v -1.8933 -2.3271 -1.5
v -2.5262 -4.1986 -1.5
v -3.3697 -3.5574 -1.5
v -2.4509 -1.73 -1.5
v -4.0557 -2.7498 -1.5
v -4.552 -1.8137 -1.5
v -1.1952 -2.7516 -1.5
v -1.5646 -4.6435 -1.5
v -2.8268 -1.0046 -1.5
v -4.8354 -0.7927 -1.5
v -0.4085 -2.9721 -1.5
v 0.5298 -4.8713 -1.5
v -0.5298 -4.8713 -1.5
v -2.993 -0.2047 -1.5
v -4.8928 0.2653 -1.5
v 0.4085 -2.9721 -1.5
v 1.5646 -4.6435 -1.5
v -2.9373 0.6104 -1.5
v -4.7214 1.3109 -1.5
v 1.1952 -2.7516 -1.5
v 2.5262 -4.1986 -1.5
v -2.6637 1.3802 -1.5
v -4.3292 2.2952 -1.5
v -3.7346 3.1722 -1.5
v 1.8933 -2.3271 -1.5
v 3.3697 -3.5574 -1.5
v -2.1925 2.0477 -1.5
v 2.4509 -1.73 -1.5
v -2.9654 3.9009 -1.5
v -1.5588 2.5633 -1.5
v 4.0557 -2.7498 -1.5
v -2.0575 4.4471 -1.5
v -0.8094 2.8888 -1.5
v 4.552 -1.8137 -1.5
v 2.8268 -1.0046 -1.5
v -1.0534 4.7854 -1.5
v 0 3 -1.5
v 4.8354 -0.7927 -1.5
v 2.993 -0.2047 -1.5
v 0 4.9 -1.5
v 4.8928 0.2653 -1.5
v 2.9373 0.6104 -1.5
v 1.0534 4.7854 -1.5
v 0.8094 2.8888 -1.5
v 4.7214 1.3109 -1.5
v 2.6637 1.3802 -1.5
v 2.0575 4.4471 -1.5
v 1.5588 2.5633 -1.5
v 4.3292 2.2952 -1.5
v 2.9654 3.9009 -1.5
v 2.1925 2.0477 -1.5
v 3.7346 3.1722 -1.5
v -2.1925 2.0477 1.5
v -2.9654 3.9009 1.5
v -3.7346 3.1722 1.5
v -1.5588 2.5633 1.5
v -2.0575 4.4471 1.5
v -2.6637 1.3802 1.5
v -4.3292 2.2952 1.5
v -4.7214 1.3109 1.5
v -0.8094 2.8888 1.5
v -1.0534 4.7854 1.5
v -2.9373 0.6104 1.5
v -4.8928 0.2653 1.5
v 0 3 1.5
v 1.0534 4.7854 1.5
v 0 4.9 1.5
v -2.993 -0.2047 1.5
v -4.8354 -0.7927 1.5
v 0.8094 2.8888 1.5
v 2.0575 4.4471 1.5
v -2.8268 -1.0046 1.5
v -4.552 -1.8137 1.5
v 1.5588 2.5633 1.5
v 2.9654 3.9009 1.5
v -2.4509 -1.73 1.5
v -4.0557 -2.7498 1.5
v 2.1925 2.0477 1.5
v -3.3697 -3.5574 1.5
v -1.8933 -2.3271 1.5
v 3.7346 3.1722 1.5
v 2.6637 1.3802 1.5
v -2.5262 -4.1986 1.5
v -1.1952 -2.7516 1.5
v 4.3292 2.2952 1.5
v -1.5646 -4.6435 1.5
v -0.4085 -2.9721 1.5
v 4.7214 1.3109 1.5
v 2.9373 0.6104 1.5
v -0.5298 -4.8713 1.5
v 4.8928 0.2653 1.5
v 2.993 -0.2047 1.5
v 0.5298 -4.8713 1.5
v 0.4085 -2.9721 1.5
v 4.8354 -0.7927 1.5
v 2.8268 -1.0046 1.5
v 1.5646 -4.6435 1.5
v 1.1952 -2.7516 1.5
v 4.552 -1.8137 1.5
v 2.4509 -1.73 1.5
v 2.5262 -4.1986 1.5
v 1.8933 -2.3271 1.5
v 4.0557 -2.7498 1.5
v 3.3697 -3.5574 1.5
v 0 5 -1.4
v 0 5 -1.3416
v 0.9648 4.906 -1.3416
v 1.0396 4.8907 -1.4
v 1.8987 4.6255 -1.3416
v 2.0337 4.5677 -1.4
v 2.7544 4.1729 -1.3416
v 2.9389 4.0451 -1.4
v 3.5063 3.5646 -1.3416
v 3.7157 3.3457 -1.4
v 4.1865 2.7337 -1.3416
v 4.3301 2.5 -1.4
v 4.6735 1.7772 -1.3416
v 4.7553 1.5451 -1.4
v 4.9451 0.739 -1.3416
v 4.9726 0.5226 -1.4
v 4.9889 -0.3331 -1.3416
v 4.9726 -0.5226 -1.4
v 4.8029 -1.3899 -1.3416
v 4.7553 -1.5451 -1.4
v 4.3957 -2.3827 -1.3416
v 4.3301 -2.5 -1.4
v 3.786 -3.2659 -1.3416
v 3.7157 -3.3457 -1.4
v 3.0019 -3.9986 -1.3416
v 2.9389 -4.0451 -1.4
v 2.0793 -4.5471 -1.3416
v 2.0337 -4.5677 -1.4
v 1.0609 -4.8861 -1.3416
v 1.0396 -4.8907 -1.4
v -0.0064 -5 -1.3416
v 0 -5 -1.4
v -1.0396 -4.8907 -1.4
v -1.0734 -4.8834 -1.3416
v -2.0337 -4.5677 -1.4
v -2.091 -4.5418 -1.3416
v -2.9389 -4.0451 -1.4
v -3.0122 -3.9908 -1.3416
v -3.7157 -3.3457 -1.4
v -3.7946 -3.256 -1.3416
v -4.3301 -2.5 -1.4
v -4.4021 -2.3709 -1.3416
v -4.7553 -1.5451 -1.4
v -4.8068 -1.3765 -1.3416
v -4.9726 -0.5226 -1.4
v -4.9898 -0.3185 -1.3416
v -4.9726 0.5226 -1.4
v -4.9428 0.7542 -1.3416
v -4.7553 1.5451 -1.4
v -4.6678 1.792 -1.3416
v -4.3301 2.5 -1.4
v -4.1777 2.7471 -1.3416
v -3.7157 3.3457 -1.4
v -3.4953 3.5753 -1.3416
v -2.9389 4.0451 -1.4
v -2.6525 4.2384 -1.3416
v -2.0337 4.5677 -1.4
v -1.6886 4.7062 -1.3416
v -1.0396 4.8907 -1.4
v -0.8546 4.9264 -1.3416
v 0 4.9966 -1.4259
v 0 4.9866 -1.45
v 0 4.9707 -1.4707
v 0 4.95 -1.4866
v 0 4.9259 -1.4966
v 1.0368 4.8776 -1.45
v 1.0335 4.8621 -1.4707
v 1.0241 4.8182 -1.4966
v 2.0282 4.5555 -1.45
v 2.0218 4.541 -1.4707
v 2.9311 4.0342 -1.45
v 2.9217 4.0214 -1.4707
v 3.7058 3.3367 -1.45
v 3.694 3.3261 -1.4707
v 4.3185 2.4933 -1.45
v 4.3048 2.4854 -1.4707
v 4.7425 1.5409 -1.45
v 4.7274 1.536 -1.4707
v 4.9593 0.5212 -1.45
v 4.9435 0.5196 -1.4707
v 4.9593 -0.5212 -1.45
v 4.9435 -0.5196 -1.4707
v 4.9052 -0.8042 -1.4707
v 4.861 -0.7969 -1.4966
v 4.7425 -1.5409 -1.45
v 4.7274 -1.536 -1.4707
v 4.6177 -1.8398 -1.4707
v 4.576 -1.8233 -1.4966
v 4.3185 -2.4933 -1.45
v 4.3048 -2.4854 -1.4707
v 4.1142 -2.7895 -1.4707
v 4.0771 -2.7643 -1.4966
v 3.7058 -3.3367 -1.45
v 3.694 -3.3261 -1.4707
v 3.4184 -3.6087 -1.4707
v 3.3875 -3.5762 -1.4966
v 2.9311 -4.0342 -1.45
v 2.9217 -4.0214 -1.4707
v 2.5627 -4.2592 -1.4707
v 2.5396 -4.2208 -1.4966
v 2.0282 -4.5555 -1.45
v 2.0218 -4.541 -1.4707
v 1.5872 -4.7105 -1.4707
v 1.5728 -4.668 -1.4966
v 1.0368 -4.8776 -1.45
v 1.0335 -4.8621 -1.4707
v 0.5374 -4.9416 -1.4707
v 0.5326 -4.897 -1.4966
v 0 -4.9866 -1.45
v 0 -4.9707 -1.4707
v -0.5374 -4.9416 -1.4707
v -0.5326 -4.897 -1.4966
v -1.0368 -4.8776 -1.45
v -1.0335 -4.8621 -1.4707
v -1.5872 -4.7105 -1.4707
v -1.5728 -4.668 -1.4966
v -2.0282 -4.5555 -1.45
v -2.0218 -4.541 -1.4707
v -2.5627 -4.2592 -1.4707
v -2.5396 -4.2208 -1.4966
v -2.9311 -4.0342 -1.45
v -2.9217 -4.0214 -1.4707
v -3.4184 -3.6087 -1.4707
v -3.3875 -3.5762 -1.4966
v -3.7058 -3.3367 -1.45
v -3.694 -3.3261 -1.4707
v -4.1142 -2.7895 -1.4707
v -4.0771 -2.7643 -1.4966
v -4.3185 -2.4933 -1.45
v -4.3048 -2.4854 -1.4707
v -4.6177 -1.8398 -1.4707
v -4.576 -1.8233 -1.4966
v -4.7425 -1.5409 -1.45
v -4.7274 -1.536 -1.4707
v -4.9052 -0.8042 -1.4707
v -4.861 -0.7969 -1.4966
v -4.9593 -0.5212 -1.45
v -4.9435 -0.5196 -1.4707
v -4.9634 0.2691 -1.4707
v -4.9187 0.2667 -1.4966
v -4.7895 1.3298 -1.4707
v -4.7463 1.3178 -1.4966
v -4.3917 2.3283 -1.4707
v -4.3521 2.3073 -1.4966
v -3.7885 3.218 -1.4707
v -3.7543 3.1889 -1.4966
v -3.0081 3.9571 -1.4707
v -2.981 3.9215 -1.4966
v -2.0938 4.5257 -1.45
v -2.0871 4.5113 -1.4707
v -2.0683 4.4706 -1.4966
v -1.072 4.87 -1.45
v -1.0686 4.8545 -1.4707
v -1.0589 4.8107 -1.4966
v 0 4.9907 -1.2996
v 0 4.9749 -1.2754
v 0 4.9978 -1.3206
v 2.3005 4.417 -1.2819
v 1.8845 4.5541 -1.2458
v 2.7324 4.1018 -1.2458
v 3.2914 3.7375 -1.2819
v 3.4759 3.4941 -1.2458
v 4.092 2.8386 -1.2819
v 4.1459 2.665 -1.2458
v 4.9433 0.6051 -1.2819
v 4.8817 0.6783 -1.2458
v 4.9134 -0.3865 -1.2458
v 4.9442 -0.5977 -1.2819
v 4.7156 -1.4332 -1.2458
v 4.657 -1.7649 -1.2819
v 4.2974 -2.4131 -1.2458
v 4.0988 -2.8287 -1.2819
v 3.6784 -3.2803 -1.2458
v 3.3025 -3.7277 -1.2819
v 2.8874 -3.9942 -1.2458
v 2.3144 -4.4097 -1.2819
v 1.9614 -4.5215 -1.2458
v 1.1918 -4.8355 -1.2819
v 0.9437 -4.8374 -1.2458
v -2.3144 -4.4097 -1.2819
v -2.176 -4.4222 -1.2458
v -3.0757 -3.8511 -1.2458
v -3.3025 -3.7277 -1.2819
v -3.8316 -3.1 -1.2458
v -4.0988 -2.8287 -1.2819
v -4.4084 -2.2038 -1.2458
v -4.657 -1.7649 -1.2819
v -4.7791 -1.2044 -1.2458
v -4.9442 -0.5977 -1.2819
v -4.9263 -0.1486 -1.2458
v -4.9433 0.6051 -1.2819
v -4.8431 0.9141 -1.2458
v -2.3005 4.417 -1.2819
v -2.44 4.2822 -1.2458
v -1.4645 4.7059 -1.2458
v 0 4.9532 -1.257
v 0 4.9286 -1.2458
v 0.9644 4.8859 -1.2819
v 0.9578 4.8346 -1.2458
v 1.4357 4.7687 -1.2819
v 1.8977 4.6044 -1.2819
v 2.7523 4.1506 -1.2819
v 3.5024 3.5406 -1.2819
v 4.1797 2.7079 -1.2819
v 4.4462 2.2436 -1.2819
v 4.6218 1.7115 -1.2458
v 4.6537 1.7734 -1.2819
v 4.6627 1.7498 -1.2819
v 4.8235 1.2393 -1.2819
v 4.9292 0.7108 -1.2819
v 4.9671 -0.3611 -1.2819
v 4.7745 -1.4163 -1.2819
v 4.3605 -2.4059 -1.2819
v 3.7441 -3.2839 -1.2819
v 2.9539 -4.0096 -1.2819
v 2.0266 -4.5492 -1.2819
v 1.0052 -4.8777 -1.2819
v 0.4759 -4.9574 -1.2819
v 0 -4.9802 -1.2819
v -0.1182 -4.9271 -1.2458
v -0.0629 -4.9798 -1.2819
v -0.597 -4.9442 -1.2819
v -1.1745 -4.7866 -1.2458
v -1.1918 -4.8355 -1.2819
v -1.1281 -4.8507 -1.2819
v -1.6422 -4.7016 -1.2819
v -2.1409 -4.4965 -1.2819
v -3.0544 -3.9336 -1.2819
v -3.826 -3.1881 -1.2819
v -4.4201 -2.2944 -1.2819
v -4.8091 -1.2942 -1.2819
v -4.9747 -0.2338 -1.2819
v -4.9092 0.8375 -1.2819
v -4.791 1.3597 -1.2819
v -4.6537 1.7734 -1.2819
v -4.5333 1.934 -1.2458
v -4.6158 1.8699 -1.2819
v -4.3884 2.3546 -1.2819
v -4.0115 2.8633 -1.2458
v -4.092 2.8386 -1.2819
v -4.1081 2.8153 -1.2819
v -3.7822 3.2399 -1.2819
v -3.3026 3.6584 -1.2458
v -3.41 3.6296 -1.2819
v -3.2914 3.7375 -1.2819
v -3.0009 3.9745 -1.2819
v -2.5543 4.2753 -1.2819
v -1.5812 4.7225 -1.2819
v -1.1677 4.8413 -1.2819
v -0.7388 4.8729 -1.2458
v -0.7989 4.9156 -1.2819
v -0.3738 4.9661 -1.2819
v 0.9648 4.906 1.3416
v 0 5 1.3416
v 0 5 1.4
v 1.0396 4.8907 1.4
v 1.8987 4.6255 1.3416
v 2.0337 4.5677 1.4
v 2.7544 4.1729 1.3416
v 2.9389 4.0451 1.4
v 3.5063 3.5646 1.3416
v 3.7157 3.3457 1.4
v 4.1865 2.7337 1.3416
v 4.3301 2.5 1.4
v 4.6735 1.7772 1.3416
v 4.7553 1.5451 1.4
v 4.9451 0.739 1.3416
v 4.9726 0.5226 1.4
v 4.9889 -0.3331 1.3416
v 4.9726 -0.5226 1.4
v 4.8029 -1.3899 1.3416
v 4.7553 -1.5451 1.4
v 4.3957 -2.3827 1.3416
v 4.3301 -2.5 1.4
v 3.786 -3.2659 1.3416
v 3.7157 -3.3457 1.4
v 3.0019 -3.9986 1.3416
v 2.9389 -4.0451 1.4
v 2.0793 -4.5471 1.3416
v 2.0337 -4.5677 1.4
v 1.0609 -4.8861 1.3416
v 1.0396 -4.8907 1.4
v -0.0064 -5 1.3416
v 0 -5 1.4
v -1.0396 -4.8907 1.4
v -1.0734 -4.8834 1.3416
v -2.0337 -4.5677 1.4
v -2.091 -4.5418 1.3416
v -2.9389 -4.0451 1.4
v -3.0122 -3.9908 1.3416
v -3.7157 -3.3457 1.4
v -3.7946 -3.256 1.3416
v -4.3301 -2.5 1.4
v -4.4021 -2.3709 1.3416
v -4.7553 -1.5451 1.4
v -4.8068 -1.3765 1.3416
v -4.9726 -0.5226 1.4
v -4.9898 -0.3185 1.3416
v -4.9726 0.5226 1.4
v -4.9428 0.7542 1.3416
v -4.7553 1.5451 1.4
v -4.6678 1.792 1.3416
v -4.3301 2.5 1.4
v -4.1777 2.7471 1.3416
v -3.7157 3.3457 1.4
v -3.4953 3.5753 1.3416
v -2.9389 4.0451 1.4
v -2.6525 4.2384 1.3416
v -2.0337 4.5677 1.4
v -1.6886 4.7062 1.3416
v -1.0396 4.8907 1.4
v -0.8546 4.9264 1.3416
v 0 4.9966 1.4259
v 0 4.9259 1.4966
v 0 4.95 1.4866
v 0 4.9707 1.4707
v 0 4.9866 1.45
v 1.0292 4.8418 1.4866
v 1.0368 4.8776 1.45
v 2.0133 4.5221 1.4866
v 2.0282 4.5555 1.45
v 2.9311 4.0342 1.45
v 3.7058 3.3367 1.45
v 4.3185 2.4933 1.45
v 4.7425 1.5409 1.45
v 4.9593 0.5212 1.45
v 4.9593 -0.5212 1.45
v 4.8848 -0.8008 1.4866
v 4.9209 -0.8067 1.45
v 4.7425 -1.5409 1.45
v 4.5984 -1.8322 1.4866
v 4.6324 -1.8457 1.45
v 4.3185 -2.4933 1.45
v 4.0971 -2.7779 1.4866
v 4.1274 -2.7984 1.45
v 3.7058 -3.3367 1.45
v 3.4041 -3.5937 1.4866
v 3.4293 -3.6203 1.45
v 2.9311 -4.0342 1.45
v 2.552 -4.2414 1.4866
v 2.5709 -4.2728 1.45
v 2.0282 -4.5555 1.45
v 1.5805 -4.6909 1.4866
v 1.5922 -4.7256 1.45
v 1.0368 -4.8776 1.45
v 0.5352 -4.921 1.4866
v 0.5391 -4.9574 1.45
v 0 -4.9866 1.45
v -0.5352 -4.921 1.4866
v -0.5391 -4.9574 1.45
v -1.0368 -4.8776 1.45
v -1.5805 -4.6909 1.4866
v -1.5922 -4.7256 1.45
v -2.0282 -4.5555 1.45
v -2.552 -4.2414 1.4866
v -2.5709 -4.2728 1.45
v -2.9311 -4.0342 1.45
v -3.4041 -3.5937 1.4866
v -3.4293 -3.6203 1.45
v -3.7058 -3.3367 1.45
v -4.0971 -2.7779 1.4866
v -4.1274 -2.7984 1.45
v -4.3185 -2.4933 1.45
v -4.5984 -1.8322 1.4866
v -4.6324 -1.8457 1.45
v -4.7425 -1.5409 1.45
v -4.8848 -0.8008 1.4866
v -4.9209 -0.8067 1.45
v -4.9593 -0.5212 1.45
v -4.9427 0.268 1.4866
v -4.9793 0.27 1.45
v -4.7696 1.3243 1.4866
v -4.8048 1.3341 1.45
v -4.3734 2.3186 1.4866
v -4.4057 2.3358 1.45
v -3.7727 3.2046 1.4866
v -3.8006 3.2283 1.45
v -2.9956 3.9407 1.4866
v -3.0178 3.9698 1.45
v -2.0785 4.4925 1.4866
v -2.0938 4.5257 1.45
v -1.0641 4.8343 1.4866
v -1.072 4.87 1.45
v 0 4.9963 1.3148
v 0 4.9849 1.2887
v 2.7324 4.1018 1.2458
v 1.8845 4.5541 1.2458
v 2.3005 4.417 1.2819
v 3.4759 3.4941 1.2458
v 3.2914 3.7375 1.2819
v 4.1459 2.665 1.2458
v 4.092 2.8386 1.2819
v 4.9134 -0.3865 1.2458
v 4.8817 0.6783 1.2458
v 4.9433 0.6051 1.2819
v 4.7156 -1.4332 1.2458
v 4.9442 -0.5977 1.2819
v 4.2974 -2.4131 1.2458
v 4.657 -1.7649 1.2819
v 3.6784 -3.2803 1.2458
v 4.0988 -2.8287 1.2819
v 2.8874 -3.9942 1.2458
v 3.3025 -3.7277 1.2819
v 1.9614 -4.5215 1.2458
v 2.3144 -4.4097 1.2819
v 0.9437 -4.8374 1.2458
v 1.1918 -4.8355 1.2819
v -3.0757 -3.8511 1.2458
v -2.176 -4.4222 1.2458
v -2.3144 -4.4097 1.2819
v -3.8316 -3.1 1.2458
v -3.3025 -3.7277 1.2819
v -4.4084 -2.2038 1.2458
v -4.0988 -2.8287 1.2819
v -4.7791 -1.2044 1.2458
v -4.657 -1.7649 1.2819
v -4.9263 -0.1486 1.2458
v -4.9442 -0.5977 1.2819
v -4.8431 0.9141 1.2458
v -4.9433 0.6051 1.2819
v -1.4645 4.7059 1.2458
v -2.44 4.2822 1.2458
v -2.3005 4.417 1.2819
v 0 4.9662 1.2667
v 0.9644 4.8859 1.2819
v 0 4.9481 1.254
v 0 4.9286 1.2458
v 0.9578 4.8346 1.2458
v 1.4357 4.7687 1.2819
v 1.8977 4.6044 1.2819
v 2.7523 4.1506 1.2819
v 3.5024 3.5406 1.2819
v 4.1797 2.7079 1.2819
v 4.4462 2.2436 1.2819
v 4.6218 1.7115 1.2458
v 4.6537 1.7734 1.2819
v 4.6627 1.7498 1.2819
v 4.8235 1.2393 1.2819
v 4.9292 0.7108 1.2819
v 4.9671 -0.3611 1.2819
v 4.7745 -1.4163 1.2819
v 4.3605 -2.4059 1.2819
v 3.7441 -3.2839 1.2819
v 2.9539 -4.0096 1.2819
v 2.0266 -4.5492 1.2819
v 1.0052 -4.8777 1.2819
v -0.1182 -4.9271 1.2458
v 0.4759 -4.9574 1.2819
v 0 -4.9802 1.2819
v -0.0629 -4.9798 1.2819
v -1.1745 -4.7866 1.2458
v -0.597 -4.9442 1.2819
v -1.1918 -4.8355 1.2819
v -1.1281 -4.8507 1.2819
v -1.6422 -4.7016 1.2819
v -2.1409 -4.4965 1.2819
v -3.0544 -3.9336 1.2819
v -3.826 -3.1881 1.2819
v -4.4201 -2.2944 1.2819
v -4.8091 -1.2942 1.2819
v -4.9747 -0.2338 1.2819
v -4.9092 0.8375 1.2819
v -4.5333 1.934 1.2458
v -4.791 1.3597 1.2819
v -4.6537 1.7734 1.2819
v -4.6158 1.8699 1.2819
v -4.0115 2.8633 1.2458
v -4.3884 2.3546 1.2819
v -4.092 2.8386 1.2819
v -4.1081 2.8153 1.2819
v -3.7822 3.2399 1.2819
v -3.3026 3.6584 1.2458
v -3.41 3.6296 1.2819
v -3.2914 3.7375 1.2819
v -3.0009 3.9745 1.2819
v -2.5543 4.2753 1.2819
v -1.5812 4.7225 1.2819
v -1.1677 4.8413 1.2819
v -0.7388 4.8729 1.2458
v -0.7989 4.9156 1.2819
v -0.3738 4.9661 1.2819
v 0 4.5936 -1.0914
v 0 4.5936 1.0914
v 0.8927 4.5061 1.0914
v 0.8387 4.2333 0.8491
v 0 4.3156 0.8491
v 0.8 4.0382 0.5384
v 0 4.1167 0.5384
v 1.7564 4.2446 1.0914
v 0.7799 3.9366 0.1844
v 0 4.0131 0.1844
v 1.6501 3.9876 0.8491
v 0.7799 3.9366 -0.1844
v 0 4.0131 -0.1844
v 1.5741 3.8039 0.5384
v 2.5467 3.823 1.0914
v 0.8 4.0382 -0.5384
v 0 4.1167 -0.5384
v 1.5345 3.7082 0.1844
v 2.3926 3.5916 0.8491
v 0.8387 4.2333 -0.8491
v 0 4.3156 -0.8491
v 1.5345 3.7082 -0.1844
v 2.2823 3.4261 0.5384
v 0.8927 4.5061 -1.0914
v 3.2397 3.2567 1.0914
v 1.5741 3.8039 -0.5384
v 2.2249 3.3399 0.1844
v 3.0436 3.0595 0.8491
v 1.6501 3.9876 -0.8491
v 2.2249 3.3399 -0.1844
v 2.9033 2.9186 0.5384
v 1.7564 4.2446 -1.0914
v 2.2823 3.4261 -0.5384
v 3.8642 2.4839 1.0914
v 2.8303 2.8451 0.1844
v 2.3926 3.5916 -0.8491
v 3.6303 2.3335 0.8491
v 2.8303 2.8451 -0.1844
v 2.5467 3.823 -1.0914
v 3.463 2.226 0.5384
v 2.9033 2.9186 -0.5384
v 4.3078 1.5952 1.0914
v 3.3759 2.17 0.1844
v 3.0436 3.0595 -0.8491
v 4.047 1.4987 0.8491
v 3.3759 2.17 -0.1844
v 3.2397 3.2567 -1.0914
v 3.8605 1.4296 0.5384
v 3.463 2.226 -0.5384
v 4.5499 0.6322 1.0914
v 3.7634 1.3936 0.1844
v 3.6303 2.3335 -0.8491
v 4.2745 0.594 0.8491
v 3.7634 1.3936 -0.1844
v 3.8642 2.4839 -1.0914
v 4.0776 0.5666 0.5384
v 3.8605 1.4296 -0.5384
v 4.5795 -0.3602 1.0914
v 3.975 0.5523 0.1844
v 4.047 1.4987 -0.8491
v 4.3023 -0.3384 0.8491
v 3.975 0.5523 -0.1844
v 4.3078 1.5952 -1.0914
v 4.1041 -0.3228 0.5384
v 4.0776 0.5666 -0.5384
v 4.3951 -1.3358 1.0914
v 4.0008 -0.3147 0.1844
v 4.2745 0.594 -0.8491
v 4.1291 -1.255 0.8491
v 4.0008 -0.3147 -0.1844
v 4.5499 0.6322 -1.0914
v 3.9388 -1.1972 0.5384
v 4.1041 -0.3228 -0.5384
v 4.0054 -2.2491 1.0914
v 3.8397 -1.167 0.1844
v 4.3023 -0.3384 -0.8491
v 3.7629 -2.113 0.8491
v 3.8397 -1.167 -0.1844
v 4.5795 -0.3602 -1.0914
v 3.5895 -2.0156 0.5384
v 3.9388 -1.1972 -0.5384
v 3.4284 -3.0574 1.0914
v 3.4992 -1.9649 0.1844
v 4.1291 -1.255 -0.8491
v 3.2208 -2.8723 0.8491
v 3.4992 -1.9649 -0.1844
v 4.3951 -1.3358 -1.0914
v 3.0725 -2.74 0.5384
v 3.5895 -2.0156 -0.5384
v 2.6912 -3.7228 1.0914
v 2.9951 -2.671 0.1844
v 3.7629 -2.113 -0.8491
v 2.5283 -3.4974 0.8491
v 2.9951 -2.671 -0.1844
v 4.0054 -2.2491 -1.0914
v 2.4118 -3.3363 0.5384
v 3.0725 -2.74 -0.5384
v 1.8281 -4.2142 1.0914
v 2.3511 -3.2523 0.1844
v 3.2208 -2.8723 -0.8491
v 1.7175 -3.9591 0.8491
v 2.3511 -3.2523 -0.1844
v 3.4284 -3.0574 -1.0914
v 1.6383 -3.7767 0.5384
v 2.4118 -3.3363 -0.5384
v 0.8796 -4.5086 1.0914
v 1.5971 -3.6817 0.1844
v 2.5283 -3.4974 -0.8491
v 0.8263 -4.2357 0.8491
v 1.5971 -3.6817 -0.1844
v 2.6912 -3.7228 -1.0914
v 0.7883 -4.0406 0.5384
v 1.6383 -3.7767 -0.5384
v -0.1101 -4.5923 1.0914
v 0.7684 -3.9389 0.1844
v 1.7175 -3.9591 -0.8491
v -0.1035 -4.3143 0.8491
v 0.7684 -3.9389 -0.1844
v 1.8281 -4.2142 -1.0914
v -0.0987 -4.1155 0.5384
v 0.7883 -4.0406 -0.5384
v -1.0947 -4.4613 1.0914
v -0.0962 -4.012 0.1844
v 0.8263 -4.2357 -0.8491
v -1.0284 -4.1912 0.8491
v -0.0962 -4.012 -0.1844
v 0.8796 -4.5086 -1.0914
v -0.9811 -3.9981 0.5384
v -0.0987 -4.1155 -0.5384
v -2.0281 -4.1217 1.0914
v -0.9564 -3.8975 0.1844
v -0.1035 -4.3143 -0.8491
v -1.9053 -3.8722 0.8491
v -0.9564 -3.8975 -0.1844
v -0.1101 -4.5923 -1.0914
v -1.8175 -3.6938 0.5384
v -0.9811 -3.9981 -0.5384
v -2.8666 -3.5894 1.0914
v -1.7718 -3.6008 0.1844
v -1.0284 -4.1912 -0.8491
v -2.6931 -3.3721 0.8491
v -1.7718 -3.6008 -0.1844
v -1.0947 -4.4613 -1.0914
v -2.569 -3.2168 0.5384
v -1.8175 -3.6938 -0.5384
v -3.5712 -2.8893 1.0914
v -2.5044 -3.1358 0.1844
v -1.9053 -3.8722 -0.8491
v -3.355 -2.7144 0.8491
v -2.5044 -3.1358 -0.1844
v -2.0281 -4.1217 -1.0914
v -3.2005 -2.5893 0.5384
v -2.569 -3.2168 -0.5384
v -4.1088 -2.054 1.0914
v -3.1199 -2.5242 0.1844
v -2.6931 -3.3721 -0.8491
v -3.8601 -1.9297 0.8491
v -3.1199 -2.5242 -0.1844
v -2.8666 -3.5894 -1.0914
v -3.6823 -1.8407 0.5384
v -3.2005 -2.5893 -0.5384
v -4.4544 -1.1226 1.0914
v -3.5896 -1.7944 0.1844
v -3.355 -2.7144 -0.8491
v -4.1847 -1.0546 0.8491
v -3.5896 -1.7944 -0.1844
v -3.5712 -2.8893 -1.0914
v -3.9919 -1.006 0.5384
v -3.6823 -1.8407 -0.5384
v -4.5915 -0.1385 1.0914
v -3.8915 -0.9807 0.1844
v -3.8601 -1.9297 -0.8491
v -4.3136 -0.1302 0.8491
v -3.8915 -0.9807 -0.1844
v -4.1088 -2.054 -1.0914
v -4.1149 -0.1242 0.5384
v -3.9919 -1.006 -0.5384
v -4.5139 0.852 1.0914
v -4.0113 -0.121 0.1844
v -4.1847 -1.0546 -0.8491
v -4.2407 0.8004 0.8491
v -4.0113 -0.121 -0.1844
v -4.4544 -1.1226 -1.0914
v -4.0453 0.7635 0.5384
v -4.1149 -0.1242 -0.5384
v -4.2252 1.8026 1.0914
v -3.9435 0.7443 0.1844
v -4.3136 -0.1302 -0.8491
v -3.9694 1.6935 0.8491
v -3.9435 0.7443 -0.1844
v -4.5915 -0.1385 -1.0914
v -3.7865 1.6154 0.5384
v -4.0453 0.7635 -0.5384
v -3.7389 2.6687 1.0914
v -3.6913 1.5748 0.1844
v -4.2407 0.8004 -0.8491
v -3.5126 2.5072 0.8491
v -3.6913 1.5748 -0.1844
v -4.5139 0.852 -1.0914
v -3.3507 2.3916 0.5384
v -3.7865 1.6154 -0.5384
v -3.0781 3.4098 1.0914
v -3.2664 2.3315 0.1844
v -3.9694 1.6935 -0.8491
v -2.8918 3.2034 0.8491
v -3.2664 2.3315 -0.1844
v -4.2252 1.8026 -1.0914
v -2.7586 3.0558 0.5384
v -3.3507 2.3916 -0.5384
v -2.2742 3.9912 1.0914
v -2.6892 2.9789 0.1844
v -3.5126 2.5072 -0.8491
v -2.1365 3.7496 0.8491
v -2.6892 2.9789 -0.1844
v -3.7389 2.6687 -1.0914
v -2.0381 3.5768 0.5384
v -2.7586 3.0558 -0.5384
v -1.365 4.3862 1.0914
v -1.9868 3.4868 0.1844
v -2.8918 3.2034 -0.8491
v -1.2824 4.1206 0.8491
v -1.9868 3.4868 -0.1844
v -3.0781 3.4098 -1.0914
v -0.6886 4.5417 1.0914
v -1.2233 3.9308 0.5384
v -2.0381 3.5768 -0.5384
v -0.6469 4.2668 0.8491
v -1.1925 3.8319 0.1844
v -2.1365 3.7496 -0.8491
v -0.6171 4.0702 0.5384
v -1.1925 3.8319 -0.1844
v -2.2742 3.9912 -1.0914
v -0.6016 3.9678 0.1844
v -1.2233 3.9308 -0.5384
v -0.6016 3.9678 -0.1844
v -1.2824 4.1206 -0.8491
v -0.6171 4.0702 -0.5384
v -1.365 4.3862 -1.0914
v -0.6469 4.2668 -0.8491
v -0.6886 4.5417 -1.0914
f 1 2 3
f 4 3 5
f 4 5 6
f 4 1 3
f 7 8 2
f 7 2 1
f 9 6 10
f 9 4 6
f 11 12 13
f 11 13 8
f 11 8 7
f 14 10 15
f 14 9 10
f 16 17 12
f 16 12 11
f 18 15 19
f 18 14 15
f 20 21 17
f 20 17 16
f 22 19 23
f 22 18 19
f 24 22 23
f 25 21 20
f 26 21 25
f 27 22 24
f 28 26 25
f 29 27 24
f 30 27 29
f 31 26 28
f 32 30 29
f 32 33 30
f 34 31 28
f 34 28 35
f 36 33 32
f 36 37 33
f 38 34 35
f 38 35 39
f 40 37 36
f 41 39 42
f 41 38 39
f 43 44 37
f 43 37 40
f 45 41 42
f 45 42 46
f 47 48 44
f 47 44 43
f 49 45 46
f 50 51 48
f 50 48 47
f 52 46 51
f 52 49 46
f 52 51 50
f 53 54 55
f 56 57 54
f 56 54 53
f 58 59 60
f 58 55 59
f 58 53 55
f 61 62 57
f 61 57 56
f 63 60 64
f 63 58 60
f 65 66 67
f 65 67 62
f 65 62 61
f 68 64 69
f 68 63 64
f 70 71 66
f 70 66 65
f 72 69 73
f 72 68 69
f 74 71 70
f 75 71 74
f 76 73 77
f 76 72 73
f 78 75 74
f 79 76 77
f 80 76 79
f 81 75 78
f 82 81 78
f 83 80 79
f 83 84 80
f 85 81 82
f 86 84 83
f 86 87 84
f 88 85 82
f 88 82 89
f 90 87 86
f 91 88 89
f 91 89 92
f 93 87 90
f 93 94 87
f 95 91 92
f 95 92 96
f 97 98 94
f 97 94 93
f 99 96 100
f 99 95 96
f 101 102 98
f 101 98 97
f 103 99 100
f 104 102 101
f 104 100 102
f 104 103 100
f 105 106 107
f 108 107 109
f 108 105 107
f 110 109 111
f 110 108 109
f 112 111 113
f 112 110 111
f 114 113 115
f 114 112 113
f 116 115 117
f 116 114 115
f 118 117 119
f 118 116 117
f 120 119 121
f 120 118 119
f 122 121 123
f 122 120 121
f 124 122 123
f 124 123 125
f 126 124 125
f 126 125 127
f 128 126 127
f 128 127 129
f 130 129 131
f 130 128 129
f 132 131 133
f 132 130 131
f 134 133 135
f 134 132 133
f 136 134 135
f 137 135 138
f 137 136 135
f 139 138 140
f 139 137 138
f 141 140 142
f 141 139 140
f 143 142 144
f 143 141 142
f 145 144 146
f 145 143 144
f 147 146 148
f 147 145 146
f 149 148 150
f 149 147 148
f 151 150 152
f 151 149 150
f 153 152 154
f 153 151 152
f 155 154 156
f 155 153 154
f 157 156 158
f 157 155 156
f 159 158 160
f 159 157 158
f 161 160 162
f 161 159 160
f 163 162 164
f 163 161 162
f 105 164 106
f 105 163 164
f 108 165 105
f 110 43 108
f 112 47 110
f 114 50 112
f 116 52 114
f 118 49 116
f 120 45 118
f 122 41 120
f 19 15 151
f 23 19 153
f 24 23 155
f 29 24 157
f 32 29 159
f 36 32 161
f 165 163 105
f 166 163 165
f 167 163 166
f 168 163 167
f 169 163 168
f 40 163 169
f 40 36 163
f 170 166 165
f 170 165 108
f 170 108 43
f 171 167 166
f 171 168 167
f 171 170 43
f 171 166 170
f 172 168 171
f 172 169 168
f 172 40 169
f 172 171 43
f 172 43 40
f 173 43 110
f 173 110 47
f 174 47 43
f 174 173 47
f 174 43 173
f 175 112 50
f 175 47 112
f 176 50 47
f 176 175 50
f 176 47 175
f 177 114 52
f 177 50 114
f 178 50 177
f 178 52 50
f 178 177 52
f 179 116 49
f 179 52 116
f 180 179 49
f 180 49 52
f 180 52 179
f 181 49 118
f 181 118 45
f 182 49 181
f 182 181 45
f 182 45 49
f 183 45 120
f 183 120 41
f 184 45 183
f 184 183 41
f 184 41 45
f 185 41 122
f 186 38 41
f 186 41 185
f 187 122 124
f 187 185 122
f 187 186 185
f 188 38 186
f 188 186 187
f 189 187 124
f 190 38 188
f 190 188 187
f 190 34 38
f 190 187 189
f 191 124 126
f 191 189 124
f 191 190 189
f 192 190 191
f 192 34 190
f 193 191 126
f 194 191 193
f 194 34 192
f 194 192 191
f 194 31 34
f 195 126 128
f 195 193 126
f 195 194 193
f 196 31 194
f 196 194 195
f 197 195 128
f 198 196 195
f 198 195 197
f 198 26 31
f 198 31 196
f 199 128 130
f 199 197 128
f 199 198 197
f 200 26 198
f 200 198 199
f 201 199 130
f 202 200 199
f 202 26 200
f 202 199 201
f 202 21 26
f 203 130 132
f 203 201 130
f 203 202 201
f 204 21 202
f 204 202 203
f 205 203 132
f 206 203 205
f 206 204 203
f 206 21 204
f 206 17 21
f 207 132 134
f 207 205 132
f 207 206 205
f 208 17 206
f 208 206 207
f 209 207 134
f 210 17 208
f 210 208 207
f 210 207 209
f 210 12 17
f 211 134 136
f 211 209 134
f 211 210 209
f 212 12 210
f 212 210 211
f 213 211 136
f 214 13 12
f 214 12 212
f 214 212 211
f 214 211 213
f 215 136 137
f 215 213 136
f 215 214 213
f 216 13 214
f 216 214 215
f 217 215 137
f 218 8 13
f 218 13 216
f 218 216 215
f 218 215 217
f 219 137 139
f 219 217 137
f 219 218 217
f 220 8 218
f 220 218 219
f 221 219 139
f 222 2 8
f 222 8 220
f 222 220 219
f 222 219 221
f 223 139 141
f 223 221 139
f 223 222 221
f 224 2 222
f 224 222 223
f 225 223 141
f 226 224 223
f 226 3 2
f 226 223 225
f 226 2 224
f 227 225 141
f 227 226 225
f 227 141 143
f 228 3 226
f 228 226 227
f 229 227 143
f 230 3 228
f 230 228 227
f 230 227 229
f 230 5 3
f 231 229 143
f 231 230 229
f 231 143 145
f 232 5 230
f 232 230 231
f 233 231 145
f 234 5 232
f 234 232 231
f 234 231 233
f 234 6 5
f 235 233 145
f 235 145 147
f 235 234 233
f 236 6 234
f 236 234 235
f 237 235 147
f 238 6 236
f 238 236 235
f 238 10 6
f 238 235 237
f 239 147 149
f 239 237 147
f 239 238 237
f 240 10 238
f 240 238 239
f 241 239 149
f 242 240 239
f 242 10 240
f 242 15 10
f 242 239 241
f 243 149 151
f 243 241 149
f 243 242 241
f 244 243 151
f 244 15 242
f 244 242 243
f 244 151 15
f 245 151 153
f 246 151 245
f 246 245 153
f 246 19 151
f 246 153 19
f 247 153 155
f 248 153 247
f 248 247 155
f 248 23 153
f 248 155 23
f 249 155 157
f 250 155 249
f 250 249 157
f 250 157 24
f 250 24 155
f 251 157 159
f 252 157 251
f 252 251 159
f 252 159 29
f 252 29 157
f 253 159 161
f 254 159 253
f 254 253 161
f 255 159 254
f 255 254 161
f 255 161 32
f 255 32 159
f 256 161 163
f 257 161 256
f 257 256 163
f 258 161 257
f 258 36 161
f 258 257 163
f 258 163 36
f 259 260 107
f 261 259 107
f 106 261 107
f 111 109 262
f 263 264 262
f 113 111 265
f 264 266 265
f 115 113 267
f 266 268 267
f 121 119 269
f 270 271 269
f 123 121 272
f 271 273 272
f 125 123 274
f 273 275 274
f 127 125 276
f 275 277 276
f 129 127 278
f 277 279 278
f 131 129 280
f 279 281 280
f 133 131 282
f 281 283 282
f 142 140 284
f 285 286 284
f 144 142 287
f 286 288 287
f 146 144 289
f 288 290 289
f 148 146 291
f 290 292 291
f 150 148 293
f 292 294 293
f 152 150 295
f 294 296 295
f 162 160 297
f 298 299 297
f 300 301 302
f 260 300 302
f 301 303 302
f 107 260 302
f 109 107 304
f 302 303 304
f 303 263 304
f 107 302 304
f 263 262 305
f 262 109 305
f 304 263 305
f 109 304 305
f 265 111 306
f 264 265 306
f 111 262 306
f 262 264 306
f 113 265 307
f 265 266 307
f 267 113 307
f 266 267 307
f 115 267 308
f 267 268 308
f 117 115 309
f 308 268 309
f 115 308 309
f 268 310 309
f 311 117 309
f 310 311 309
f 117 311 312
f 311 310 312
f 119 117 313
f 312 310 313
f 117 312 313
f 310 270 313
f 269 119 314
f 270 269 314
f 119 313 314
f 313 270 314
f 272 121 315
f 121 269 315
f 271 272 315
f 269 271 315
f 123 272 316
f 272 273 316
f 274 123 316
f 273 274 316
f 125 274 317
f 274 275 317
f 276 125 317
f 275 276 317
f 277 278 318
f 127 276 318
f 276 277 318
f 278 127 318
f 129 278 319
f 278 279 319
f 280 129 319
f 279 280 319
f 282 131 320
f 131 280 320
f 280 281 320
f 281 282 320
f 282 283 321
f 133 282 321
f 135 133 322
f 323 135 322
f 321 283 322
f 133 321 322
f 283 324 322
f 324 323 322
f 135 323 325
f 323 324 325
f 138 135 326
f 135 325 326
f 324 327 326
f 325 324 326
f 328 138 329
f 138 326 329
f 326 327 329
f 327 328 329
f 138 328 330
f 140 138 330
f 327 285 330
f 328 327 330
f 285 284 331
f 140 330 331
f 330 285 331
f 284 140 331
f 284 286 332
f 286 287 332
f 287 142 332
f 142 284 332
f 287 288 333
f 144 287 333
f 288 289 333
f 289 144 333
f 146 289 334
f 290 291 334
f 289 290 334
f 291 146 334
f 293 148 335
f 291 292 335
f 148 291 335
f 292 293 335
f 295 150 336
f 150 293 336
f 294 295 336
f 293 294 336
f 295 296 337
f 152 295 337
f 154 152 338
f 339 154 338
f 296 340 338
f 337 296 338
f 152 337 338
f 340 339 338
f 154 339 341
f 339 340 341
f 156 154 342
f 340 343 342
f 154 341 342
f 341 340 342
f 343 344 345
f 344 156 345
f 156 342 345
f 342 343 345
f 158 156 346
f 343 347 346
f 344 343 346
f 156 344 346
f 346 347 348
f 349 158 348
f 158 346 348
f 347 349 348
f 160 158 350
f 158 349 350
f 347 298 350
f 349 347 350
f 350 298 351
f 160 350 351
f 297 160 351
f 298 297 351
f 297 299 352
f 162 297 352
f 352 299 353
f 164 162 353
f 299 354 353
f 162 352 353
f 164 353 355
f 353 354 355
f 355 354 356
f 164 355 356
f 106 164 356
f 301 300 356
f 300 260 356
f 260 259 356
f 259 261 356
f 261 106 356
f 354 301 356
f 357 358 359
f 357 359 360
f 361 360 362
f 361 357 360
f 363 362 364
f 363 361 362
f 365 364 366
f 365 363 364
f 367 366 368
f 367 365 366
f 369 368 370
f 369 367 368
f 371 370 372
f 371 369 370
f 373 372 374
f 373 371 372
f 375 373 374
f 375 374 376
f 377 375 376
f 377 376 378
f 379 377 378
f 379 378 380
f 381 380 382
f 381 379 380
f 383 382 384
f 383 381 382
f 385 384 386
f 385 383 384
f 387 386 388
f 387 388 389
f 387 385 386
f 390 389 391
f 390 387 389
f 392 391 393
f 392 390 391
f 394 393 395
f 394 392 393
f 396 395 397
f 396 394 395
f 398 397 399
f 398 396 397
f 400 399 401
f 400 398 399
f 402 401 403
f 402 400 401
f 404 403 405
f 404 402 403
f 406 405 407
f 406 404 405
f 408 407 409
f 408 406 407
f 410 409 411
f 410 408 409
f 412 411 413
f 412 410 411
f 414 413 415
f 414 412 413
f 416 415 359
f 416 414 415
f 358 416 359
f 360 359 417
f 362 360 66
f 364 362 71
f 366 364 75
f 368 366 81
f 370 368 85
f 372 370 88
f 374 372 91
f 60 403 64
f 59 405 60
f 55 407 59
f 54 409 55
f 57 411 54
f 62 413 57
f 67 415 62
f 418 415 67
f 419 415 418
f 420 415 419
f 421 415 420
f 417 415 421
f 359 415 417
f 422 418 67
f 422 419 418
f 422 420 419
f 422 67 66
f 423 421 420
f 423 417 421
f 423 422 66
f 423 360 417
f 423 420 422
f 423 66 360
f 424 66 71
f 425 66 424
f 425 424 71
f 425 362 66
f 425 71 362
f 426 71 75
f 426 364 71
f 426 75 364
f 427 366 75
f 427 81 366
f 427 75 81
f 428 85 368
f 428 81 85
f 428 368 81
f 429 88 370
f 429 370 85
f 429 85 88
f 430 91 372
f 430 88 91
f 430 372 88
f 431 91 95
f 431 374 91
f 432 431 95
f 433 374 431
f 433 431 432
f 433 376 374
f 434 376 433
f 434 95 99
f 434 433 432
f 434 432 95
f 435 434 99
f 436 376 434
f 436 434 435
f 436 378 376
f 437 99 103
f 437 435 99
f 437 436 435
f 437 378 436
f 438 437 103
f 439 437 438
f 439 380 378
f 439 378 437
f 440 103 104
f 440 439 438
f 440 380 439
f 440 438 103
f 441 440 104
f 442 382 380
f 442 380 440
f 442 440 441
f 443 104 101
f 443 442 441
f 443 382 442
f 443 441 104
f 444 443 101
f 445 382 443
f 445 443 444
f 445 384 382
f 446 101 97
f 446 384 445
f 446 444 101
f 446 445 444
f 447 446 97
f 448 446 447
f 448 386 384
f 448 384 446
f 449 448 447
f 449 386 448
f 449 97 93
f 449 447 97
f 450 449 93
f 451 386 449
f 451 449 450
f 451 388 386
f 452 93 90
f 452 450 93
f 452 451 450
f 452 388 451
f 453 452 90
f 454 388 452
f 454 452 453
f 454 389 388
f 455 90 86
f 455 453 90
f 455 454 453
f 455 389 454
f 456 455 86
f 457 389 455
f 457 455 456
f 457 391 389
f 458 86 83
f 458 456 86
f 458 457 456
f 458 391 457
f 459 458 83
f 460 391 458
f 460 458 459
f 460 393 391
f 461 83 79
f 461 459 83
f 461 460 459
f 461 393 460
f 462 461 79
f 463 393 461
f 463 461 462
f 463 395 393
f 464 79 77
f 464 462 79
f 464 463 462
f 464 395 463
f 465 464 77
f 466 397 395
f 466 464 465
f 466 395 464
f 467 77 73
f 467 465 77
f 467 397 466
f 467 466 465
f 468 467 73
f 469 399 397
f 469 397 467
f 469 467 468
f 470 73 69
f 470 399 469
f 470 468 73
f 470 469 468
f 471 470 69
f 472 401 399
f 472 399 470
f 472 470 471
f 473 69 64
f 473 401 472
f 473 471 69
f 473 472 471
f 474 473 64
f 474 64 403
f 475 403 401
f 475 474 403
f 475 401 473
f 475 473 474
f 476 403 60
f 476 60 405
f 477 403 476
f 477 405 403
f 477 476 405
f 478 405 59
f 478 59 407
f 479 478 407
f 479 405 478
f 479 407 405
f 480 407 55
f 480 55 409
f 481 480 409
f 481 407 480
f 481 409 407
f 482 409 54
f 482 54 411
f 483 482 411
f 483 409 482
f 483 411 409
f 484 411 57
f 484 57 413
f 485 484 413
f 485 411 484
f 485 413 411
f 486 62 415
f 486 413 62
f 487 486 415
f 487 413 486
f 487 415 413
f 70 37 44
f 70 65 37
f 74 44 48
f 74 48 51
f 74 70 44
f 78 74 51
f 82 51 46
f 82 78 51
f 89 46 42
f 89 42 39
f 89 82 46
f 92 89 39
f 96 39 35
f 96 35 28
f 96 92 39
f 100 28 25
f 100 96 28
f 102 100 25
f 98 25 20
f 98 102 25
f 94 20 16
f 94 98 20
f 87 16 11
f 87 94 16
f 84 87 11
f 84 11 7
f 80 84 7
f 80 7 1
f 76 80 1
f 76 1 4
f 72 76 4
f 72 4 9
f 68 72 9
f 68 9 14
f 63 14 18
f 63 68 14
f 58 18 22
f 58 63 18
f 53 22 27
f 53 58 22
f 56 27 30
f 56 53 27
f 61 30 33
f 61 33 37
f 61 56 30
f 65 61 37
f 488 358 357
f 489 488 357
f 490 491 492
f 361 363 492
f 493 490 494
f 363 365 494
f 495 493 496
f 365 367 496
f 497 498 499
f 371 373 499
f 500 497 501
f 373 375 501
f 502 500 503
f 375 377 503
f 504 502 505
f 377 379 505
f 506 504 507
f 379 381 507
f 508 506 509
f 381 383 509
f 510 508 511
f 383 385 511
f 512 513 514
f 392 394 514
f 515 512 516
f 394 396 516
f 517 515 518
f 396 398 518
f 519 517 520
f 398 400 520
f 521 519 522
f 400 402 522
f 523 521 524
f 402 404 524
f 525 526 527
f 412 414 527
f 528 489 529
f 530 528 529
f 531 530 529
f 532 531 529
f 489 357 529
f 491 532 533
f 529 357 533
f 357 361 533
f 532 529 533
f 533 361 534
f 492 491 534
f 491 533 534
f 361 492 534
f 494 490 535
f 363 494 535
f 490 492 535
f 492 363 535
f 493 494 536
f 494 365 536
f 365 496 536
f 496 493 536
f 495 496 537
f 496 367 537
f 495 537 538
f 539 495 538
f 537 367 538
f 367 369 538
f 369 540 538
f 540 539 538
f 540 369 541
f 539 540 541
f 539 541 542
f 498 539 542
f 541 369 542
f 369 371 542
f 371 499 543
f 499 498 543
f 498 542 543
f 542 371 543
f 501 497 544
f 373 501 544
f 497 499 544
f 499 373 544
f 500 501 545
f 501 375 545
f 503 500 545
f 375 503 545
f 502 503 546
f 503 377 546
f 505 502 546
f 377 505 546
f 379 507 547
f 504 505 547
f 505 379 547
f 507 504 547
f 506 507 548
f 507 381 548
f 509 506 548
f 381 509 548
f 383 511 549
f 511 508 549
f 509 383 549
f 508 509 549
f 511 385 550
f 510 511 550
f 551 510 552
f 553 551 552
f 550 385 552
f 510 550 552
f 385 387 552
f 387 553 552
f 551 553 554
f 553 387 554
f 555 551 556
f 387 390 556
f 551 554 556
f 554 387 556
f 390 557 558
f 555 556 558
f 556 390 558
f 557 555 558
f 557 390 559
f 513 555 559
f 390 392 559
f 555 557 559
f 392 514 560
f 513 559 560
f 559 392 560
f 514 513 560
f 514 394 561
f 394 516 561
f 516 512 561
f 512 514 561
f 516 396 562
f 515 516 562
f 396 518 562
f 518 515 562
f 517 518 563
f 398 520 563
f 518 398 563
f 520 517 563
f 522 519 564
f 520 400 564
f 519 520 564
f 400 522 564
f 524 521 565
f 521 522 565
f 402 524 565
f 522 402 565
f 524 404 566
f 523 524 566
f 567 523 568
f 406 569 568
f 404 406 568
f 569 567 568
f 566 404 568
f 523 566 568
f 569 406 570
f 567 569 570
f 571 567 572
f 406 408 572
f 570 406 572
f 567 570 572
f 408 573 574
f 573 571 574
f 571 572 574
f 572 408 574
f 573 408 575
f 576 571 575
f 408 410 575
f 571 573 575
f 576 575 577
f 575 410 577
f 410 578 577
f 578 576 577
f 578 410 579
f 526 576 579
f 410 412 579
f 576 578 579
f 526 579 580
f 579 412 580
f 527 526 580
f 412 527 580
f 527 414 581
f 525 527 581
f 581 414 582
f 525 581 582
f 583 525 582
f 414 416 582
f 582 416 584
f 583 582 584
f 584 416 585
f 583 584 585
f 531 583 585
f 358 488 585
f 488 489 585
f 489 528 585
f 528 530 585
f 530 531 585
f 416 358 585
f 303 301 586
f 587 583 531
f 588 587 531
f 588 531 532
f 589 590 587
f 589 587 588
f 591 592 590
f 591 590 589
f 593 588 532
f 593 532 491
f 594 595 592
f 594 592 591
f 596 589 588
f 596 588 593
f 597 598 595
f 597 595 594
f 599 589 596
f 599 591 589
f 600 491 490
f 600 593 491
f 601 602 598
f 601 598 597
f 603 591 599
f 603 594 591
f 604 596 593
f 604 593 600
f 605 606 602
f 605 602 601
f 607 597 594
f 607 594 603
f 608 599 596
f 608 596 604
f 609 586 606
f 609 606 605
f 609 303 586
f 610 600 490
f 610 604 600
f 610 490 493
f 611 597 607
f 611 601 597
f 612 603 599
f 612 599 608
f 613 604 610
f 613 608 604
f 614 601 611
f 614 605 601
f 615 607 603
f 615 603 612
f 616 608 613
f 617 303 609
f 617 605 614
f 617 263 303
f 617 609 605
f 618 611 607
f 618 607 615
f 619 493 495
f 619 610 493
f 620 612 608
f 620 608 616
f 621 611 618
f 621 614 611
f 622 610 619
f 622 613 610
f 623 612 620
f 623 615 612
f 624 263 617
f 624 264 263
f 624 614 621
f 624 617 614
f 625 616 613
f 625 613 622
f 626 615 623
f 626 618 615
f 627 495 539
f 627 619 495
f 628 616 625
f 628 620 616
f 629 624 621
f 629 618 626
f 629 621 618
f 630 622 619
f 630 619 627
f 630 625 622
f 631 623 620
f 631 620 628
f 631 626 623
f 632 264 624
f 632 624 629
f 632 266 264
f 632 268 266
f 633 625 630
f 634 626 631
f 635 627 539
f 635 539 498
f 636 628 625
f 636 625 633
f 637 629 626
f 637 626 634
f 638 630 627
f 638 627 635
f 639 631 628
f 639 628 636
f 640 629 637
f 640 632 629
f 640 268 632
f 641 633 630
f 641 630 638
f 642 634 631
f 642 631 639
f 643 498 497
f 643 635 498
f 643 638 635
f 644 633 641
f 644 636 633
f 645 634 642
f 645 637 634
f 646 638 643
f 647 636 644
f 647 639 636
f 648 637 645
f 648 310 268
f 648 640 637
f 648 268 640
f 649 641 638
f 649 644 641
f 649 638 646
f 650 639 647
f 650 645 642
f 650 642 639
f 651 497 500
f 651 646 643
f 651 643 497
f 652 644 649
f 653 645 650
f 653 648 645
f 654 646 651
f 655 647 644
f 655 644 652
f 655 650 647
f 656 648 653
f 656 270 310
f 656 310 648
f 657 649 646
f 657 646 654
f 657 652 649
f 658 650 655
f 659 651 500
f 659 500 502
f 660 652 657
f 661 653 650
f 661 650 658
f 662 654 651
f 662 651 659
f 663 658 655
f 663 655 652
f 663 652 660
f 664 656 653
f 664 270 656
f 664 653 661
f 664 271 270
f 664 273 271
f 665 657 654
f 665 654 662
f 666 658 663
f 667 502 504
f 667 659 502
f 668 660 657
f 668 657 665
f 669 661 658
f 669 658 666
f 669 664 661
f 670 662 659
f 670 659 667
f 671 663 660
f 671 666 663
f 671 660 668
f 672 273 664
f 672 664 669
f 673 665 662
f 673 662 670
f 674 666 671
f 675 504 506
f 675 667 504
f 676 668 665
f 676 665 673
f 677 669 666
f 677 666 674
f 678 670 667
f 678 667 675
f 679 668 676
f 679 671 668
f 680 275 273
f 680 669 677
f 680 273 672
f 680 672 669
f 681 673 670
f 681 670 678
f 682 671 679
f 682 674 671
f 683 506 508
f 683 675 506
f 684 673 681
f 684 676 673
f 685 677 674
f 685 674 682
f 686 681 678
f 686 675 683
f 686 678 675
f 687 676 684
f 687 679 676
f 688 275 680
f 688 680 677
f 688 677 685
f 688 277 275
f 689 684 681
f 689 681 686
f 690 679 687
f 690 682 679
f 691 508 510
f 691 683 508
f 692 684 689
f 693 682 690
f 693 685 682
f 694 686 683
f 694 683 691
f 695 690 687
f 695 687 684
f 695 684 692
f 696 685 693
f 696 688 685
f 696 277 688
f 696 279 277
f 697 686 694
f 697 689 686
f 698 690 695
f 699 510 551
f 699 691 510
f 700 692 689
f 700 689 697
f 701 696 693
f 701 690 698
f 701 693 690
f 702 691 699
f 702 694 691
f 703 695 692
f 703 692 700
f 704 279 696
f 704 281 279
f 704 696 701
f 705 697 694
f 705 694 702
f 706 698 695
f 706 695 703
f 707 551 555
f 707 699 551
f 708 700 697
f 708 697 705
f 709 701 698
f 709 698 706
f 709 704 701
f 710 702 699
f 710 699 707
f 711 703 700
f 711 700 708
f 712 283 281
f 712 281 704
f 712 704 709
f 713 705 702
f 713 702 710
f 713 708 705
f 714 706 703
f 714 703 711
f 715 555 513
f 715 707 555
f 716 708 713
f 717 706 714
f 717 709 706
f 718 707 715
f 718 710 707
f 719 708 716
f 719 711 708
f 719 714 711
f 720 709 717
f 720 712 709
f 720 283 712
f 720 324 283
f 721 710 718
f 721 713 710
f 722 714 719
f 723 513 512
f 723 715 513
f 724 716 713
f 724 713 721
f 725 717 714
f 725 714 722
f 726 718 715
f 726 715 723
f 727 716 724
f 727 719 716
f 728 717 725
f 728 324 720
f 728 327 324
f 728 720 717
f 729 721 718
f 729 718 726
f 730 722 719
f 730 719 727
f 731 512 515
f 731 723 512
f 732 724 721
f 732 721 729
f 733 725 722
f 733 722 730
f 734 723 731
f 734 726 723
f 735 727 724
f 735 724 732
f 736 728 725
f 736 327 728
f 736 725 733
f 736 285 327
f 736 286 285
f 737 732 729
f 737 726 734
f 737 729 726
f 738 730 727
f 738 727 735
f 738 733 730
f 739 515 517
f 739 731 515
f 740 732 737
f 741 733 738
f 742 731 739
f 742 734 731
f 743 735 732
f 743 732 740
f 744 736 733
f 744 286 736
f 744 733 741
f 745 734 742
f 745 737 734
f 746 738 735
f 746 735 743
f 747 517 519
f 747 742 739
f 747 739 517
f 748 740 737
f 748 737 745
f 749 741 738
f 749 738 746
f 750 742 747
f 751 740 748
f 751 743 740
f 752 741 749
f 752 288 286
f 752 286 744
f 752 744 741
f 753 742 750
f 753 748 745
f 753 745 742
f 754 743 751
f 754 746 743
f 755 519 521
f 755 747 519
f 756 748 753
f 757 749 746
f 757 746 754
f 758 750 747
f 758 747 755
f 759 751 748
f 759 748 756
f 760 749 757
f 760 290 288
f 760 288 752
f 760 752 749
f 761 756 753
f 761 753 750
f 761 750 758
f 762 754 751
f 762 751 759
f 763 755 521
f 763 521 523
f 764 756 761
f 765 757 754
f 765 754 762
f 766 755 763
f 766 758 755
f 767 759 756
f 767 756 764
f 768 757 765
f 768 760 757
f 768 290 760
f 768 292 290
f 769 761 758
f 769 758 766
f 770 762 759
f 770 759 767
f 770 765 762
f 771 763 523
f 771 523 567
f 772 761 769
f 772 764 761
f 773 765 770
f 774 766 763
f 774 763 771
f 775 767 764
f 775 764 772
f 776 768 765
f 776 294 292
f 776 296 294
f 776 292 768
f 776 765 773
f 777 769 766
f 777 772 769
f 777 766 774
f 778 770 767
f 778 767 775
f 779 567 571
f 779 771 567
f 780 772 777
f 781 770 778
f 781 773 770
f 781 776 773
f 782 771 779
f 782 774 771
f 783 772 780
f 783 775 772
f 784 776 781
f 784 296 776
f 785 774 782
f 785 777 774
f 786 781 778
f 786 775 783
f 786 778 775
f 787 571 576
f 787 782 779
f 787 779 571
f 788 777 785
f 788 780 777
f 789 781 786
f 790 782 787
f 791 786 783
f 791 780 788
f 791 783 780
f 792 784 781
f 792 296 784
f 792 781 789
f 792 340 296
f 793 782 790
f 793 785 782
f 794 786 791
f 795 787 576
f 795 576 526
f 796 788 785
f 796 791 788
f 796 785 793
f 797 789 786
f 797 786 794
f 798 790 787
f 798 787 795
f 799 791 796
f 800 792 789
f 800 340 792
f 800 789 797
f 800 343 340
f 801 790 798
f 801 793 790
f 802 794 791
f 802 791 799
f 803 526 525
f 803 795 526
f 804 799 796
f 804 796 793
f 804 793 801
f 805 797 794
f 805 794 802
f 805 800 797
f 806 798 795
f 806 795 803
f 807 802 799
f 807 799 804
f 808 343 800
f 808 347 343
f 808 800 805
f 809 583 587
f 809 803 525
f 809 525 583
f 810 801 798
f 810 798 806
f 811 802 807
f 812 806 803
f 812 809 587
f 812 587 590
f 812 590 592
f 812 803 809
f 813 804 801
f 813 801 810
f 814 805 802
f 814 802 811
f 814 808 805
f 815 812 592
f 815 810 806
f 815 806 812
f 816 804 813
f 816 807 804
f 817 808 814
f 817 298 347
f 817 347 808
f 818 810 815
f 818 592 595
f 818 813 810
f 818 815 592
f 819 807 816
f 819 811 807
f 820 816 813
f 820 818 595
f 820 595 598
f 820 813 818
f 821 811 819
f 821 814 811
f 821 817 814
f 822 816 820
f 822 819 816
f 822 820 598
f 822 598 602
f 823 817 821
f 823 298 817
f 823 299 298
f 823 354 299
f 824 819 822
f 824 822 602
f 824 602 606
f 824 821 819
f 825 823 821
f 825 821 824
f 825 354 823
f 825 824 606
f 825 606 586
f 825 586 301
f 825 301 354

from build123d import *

# Parameters (mm, degrees)
CONG_2_R = 0.1


with BuildPart() as part:
    # Esquisse1 → Révolution1 (revolve)
    with BuildSketch(Plane(origin=(0, 0, 0), x_dir=(0, 0, -1), z_dir=(1, 0, 0))):
        with BuildLine():
            Line((-1.5, 3), (-1.5, 5))
            Line((-1.5, 5), (-1.264911064, 5))
            ThreePointArc((-1.264911064, 5), (0, 4), (1.264911064, 5))
            Line((1.264911064, 5), (1.5, 5))
            Line((1.5, 5), (1.5, 3))
            Line((1.5, 3), (-1.5, 3))
        make_face()
    revolve(axis=Axis((0, 0, 0), (0, 0, -1)))

    # Congé2
    cong_2_edges = [part.edges().sort_by_distance(p)[0] for p in [
        (0, -5, -1.5),
        (0, -5, -1.264911064),
        (0, -5, 1.264911064),
        (0, -5, 1.5),
    ]]
    fillet(cong_2_edges, radius=CONG_2_R)


solid = part.part
